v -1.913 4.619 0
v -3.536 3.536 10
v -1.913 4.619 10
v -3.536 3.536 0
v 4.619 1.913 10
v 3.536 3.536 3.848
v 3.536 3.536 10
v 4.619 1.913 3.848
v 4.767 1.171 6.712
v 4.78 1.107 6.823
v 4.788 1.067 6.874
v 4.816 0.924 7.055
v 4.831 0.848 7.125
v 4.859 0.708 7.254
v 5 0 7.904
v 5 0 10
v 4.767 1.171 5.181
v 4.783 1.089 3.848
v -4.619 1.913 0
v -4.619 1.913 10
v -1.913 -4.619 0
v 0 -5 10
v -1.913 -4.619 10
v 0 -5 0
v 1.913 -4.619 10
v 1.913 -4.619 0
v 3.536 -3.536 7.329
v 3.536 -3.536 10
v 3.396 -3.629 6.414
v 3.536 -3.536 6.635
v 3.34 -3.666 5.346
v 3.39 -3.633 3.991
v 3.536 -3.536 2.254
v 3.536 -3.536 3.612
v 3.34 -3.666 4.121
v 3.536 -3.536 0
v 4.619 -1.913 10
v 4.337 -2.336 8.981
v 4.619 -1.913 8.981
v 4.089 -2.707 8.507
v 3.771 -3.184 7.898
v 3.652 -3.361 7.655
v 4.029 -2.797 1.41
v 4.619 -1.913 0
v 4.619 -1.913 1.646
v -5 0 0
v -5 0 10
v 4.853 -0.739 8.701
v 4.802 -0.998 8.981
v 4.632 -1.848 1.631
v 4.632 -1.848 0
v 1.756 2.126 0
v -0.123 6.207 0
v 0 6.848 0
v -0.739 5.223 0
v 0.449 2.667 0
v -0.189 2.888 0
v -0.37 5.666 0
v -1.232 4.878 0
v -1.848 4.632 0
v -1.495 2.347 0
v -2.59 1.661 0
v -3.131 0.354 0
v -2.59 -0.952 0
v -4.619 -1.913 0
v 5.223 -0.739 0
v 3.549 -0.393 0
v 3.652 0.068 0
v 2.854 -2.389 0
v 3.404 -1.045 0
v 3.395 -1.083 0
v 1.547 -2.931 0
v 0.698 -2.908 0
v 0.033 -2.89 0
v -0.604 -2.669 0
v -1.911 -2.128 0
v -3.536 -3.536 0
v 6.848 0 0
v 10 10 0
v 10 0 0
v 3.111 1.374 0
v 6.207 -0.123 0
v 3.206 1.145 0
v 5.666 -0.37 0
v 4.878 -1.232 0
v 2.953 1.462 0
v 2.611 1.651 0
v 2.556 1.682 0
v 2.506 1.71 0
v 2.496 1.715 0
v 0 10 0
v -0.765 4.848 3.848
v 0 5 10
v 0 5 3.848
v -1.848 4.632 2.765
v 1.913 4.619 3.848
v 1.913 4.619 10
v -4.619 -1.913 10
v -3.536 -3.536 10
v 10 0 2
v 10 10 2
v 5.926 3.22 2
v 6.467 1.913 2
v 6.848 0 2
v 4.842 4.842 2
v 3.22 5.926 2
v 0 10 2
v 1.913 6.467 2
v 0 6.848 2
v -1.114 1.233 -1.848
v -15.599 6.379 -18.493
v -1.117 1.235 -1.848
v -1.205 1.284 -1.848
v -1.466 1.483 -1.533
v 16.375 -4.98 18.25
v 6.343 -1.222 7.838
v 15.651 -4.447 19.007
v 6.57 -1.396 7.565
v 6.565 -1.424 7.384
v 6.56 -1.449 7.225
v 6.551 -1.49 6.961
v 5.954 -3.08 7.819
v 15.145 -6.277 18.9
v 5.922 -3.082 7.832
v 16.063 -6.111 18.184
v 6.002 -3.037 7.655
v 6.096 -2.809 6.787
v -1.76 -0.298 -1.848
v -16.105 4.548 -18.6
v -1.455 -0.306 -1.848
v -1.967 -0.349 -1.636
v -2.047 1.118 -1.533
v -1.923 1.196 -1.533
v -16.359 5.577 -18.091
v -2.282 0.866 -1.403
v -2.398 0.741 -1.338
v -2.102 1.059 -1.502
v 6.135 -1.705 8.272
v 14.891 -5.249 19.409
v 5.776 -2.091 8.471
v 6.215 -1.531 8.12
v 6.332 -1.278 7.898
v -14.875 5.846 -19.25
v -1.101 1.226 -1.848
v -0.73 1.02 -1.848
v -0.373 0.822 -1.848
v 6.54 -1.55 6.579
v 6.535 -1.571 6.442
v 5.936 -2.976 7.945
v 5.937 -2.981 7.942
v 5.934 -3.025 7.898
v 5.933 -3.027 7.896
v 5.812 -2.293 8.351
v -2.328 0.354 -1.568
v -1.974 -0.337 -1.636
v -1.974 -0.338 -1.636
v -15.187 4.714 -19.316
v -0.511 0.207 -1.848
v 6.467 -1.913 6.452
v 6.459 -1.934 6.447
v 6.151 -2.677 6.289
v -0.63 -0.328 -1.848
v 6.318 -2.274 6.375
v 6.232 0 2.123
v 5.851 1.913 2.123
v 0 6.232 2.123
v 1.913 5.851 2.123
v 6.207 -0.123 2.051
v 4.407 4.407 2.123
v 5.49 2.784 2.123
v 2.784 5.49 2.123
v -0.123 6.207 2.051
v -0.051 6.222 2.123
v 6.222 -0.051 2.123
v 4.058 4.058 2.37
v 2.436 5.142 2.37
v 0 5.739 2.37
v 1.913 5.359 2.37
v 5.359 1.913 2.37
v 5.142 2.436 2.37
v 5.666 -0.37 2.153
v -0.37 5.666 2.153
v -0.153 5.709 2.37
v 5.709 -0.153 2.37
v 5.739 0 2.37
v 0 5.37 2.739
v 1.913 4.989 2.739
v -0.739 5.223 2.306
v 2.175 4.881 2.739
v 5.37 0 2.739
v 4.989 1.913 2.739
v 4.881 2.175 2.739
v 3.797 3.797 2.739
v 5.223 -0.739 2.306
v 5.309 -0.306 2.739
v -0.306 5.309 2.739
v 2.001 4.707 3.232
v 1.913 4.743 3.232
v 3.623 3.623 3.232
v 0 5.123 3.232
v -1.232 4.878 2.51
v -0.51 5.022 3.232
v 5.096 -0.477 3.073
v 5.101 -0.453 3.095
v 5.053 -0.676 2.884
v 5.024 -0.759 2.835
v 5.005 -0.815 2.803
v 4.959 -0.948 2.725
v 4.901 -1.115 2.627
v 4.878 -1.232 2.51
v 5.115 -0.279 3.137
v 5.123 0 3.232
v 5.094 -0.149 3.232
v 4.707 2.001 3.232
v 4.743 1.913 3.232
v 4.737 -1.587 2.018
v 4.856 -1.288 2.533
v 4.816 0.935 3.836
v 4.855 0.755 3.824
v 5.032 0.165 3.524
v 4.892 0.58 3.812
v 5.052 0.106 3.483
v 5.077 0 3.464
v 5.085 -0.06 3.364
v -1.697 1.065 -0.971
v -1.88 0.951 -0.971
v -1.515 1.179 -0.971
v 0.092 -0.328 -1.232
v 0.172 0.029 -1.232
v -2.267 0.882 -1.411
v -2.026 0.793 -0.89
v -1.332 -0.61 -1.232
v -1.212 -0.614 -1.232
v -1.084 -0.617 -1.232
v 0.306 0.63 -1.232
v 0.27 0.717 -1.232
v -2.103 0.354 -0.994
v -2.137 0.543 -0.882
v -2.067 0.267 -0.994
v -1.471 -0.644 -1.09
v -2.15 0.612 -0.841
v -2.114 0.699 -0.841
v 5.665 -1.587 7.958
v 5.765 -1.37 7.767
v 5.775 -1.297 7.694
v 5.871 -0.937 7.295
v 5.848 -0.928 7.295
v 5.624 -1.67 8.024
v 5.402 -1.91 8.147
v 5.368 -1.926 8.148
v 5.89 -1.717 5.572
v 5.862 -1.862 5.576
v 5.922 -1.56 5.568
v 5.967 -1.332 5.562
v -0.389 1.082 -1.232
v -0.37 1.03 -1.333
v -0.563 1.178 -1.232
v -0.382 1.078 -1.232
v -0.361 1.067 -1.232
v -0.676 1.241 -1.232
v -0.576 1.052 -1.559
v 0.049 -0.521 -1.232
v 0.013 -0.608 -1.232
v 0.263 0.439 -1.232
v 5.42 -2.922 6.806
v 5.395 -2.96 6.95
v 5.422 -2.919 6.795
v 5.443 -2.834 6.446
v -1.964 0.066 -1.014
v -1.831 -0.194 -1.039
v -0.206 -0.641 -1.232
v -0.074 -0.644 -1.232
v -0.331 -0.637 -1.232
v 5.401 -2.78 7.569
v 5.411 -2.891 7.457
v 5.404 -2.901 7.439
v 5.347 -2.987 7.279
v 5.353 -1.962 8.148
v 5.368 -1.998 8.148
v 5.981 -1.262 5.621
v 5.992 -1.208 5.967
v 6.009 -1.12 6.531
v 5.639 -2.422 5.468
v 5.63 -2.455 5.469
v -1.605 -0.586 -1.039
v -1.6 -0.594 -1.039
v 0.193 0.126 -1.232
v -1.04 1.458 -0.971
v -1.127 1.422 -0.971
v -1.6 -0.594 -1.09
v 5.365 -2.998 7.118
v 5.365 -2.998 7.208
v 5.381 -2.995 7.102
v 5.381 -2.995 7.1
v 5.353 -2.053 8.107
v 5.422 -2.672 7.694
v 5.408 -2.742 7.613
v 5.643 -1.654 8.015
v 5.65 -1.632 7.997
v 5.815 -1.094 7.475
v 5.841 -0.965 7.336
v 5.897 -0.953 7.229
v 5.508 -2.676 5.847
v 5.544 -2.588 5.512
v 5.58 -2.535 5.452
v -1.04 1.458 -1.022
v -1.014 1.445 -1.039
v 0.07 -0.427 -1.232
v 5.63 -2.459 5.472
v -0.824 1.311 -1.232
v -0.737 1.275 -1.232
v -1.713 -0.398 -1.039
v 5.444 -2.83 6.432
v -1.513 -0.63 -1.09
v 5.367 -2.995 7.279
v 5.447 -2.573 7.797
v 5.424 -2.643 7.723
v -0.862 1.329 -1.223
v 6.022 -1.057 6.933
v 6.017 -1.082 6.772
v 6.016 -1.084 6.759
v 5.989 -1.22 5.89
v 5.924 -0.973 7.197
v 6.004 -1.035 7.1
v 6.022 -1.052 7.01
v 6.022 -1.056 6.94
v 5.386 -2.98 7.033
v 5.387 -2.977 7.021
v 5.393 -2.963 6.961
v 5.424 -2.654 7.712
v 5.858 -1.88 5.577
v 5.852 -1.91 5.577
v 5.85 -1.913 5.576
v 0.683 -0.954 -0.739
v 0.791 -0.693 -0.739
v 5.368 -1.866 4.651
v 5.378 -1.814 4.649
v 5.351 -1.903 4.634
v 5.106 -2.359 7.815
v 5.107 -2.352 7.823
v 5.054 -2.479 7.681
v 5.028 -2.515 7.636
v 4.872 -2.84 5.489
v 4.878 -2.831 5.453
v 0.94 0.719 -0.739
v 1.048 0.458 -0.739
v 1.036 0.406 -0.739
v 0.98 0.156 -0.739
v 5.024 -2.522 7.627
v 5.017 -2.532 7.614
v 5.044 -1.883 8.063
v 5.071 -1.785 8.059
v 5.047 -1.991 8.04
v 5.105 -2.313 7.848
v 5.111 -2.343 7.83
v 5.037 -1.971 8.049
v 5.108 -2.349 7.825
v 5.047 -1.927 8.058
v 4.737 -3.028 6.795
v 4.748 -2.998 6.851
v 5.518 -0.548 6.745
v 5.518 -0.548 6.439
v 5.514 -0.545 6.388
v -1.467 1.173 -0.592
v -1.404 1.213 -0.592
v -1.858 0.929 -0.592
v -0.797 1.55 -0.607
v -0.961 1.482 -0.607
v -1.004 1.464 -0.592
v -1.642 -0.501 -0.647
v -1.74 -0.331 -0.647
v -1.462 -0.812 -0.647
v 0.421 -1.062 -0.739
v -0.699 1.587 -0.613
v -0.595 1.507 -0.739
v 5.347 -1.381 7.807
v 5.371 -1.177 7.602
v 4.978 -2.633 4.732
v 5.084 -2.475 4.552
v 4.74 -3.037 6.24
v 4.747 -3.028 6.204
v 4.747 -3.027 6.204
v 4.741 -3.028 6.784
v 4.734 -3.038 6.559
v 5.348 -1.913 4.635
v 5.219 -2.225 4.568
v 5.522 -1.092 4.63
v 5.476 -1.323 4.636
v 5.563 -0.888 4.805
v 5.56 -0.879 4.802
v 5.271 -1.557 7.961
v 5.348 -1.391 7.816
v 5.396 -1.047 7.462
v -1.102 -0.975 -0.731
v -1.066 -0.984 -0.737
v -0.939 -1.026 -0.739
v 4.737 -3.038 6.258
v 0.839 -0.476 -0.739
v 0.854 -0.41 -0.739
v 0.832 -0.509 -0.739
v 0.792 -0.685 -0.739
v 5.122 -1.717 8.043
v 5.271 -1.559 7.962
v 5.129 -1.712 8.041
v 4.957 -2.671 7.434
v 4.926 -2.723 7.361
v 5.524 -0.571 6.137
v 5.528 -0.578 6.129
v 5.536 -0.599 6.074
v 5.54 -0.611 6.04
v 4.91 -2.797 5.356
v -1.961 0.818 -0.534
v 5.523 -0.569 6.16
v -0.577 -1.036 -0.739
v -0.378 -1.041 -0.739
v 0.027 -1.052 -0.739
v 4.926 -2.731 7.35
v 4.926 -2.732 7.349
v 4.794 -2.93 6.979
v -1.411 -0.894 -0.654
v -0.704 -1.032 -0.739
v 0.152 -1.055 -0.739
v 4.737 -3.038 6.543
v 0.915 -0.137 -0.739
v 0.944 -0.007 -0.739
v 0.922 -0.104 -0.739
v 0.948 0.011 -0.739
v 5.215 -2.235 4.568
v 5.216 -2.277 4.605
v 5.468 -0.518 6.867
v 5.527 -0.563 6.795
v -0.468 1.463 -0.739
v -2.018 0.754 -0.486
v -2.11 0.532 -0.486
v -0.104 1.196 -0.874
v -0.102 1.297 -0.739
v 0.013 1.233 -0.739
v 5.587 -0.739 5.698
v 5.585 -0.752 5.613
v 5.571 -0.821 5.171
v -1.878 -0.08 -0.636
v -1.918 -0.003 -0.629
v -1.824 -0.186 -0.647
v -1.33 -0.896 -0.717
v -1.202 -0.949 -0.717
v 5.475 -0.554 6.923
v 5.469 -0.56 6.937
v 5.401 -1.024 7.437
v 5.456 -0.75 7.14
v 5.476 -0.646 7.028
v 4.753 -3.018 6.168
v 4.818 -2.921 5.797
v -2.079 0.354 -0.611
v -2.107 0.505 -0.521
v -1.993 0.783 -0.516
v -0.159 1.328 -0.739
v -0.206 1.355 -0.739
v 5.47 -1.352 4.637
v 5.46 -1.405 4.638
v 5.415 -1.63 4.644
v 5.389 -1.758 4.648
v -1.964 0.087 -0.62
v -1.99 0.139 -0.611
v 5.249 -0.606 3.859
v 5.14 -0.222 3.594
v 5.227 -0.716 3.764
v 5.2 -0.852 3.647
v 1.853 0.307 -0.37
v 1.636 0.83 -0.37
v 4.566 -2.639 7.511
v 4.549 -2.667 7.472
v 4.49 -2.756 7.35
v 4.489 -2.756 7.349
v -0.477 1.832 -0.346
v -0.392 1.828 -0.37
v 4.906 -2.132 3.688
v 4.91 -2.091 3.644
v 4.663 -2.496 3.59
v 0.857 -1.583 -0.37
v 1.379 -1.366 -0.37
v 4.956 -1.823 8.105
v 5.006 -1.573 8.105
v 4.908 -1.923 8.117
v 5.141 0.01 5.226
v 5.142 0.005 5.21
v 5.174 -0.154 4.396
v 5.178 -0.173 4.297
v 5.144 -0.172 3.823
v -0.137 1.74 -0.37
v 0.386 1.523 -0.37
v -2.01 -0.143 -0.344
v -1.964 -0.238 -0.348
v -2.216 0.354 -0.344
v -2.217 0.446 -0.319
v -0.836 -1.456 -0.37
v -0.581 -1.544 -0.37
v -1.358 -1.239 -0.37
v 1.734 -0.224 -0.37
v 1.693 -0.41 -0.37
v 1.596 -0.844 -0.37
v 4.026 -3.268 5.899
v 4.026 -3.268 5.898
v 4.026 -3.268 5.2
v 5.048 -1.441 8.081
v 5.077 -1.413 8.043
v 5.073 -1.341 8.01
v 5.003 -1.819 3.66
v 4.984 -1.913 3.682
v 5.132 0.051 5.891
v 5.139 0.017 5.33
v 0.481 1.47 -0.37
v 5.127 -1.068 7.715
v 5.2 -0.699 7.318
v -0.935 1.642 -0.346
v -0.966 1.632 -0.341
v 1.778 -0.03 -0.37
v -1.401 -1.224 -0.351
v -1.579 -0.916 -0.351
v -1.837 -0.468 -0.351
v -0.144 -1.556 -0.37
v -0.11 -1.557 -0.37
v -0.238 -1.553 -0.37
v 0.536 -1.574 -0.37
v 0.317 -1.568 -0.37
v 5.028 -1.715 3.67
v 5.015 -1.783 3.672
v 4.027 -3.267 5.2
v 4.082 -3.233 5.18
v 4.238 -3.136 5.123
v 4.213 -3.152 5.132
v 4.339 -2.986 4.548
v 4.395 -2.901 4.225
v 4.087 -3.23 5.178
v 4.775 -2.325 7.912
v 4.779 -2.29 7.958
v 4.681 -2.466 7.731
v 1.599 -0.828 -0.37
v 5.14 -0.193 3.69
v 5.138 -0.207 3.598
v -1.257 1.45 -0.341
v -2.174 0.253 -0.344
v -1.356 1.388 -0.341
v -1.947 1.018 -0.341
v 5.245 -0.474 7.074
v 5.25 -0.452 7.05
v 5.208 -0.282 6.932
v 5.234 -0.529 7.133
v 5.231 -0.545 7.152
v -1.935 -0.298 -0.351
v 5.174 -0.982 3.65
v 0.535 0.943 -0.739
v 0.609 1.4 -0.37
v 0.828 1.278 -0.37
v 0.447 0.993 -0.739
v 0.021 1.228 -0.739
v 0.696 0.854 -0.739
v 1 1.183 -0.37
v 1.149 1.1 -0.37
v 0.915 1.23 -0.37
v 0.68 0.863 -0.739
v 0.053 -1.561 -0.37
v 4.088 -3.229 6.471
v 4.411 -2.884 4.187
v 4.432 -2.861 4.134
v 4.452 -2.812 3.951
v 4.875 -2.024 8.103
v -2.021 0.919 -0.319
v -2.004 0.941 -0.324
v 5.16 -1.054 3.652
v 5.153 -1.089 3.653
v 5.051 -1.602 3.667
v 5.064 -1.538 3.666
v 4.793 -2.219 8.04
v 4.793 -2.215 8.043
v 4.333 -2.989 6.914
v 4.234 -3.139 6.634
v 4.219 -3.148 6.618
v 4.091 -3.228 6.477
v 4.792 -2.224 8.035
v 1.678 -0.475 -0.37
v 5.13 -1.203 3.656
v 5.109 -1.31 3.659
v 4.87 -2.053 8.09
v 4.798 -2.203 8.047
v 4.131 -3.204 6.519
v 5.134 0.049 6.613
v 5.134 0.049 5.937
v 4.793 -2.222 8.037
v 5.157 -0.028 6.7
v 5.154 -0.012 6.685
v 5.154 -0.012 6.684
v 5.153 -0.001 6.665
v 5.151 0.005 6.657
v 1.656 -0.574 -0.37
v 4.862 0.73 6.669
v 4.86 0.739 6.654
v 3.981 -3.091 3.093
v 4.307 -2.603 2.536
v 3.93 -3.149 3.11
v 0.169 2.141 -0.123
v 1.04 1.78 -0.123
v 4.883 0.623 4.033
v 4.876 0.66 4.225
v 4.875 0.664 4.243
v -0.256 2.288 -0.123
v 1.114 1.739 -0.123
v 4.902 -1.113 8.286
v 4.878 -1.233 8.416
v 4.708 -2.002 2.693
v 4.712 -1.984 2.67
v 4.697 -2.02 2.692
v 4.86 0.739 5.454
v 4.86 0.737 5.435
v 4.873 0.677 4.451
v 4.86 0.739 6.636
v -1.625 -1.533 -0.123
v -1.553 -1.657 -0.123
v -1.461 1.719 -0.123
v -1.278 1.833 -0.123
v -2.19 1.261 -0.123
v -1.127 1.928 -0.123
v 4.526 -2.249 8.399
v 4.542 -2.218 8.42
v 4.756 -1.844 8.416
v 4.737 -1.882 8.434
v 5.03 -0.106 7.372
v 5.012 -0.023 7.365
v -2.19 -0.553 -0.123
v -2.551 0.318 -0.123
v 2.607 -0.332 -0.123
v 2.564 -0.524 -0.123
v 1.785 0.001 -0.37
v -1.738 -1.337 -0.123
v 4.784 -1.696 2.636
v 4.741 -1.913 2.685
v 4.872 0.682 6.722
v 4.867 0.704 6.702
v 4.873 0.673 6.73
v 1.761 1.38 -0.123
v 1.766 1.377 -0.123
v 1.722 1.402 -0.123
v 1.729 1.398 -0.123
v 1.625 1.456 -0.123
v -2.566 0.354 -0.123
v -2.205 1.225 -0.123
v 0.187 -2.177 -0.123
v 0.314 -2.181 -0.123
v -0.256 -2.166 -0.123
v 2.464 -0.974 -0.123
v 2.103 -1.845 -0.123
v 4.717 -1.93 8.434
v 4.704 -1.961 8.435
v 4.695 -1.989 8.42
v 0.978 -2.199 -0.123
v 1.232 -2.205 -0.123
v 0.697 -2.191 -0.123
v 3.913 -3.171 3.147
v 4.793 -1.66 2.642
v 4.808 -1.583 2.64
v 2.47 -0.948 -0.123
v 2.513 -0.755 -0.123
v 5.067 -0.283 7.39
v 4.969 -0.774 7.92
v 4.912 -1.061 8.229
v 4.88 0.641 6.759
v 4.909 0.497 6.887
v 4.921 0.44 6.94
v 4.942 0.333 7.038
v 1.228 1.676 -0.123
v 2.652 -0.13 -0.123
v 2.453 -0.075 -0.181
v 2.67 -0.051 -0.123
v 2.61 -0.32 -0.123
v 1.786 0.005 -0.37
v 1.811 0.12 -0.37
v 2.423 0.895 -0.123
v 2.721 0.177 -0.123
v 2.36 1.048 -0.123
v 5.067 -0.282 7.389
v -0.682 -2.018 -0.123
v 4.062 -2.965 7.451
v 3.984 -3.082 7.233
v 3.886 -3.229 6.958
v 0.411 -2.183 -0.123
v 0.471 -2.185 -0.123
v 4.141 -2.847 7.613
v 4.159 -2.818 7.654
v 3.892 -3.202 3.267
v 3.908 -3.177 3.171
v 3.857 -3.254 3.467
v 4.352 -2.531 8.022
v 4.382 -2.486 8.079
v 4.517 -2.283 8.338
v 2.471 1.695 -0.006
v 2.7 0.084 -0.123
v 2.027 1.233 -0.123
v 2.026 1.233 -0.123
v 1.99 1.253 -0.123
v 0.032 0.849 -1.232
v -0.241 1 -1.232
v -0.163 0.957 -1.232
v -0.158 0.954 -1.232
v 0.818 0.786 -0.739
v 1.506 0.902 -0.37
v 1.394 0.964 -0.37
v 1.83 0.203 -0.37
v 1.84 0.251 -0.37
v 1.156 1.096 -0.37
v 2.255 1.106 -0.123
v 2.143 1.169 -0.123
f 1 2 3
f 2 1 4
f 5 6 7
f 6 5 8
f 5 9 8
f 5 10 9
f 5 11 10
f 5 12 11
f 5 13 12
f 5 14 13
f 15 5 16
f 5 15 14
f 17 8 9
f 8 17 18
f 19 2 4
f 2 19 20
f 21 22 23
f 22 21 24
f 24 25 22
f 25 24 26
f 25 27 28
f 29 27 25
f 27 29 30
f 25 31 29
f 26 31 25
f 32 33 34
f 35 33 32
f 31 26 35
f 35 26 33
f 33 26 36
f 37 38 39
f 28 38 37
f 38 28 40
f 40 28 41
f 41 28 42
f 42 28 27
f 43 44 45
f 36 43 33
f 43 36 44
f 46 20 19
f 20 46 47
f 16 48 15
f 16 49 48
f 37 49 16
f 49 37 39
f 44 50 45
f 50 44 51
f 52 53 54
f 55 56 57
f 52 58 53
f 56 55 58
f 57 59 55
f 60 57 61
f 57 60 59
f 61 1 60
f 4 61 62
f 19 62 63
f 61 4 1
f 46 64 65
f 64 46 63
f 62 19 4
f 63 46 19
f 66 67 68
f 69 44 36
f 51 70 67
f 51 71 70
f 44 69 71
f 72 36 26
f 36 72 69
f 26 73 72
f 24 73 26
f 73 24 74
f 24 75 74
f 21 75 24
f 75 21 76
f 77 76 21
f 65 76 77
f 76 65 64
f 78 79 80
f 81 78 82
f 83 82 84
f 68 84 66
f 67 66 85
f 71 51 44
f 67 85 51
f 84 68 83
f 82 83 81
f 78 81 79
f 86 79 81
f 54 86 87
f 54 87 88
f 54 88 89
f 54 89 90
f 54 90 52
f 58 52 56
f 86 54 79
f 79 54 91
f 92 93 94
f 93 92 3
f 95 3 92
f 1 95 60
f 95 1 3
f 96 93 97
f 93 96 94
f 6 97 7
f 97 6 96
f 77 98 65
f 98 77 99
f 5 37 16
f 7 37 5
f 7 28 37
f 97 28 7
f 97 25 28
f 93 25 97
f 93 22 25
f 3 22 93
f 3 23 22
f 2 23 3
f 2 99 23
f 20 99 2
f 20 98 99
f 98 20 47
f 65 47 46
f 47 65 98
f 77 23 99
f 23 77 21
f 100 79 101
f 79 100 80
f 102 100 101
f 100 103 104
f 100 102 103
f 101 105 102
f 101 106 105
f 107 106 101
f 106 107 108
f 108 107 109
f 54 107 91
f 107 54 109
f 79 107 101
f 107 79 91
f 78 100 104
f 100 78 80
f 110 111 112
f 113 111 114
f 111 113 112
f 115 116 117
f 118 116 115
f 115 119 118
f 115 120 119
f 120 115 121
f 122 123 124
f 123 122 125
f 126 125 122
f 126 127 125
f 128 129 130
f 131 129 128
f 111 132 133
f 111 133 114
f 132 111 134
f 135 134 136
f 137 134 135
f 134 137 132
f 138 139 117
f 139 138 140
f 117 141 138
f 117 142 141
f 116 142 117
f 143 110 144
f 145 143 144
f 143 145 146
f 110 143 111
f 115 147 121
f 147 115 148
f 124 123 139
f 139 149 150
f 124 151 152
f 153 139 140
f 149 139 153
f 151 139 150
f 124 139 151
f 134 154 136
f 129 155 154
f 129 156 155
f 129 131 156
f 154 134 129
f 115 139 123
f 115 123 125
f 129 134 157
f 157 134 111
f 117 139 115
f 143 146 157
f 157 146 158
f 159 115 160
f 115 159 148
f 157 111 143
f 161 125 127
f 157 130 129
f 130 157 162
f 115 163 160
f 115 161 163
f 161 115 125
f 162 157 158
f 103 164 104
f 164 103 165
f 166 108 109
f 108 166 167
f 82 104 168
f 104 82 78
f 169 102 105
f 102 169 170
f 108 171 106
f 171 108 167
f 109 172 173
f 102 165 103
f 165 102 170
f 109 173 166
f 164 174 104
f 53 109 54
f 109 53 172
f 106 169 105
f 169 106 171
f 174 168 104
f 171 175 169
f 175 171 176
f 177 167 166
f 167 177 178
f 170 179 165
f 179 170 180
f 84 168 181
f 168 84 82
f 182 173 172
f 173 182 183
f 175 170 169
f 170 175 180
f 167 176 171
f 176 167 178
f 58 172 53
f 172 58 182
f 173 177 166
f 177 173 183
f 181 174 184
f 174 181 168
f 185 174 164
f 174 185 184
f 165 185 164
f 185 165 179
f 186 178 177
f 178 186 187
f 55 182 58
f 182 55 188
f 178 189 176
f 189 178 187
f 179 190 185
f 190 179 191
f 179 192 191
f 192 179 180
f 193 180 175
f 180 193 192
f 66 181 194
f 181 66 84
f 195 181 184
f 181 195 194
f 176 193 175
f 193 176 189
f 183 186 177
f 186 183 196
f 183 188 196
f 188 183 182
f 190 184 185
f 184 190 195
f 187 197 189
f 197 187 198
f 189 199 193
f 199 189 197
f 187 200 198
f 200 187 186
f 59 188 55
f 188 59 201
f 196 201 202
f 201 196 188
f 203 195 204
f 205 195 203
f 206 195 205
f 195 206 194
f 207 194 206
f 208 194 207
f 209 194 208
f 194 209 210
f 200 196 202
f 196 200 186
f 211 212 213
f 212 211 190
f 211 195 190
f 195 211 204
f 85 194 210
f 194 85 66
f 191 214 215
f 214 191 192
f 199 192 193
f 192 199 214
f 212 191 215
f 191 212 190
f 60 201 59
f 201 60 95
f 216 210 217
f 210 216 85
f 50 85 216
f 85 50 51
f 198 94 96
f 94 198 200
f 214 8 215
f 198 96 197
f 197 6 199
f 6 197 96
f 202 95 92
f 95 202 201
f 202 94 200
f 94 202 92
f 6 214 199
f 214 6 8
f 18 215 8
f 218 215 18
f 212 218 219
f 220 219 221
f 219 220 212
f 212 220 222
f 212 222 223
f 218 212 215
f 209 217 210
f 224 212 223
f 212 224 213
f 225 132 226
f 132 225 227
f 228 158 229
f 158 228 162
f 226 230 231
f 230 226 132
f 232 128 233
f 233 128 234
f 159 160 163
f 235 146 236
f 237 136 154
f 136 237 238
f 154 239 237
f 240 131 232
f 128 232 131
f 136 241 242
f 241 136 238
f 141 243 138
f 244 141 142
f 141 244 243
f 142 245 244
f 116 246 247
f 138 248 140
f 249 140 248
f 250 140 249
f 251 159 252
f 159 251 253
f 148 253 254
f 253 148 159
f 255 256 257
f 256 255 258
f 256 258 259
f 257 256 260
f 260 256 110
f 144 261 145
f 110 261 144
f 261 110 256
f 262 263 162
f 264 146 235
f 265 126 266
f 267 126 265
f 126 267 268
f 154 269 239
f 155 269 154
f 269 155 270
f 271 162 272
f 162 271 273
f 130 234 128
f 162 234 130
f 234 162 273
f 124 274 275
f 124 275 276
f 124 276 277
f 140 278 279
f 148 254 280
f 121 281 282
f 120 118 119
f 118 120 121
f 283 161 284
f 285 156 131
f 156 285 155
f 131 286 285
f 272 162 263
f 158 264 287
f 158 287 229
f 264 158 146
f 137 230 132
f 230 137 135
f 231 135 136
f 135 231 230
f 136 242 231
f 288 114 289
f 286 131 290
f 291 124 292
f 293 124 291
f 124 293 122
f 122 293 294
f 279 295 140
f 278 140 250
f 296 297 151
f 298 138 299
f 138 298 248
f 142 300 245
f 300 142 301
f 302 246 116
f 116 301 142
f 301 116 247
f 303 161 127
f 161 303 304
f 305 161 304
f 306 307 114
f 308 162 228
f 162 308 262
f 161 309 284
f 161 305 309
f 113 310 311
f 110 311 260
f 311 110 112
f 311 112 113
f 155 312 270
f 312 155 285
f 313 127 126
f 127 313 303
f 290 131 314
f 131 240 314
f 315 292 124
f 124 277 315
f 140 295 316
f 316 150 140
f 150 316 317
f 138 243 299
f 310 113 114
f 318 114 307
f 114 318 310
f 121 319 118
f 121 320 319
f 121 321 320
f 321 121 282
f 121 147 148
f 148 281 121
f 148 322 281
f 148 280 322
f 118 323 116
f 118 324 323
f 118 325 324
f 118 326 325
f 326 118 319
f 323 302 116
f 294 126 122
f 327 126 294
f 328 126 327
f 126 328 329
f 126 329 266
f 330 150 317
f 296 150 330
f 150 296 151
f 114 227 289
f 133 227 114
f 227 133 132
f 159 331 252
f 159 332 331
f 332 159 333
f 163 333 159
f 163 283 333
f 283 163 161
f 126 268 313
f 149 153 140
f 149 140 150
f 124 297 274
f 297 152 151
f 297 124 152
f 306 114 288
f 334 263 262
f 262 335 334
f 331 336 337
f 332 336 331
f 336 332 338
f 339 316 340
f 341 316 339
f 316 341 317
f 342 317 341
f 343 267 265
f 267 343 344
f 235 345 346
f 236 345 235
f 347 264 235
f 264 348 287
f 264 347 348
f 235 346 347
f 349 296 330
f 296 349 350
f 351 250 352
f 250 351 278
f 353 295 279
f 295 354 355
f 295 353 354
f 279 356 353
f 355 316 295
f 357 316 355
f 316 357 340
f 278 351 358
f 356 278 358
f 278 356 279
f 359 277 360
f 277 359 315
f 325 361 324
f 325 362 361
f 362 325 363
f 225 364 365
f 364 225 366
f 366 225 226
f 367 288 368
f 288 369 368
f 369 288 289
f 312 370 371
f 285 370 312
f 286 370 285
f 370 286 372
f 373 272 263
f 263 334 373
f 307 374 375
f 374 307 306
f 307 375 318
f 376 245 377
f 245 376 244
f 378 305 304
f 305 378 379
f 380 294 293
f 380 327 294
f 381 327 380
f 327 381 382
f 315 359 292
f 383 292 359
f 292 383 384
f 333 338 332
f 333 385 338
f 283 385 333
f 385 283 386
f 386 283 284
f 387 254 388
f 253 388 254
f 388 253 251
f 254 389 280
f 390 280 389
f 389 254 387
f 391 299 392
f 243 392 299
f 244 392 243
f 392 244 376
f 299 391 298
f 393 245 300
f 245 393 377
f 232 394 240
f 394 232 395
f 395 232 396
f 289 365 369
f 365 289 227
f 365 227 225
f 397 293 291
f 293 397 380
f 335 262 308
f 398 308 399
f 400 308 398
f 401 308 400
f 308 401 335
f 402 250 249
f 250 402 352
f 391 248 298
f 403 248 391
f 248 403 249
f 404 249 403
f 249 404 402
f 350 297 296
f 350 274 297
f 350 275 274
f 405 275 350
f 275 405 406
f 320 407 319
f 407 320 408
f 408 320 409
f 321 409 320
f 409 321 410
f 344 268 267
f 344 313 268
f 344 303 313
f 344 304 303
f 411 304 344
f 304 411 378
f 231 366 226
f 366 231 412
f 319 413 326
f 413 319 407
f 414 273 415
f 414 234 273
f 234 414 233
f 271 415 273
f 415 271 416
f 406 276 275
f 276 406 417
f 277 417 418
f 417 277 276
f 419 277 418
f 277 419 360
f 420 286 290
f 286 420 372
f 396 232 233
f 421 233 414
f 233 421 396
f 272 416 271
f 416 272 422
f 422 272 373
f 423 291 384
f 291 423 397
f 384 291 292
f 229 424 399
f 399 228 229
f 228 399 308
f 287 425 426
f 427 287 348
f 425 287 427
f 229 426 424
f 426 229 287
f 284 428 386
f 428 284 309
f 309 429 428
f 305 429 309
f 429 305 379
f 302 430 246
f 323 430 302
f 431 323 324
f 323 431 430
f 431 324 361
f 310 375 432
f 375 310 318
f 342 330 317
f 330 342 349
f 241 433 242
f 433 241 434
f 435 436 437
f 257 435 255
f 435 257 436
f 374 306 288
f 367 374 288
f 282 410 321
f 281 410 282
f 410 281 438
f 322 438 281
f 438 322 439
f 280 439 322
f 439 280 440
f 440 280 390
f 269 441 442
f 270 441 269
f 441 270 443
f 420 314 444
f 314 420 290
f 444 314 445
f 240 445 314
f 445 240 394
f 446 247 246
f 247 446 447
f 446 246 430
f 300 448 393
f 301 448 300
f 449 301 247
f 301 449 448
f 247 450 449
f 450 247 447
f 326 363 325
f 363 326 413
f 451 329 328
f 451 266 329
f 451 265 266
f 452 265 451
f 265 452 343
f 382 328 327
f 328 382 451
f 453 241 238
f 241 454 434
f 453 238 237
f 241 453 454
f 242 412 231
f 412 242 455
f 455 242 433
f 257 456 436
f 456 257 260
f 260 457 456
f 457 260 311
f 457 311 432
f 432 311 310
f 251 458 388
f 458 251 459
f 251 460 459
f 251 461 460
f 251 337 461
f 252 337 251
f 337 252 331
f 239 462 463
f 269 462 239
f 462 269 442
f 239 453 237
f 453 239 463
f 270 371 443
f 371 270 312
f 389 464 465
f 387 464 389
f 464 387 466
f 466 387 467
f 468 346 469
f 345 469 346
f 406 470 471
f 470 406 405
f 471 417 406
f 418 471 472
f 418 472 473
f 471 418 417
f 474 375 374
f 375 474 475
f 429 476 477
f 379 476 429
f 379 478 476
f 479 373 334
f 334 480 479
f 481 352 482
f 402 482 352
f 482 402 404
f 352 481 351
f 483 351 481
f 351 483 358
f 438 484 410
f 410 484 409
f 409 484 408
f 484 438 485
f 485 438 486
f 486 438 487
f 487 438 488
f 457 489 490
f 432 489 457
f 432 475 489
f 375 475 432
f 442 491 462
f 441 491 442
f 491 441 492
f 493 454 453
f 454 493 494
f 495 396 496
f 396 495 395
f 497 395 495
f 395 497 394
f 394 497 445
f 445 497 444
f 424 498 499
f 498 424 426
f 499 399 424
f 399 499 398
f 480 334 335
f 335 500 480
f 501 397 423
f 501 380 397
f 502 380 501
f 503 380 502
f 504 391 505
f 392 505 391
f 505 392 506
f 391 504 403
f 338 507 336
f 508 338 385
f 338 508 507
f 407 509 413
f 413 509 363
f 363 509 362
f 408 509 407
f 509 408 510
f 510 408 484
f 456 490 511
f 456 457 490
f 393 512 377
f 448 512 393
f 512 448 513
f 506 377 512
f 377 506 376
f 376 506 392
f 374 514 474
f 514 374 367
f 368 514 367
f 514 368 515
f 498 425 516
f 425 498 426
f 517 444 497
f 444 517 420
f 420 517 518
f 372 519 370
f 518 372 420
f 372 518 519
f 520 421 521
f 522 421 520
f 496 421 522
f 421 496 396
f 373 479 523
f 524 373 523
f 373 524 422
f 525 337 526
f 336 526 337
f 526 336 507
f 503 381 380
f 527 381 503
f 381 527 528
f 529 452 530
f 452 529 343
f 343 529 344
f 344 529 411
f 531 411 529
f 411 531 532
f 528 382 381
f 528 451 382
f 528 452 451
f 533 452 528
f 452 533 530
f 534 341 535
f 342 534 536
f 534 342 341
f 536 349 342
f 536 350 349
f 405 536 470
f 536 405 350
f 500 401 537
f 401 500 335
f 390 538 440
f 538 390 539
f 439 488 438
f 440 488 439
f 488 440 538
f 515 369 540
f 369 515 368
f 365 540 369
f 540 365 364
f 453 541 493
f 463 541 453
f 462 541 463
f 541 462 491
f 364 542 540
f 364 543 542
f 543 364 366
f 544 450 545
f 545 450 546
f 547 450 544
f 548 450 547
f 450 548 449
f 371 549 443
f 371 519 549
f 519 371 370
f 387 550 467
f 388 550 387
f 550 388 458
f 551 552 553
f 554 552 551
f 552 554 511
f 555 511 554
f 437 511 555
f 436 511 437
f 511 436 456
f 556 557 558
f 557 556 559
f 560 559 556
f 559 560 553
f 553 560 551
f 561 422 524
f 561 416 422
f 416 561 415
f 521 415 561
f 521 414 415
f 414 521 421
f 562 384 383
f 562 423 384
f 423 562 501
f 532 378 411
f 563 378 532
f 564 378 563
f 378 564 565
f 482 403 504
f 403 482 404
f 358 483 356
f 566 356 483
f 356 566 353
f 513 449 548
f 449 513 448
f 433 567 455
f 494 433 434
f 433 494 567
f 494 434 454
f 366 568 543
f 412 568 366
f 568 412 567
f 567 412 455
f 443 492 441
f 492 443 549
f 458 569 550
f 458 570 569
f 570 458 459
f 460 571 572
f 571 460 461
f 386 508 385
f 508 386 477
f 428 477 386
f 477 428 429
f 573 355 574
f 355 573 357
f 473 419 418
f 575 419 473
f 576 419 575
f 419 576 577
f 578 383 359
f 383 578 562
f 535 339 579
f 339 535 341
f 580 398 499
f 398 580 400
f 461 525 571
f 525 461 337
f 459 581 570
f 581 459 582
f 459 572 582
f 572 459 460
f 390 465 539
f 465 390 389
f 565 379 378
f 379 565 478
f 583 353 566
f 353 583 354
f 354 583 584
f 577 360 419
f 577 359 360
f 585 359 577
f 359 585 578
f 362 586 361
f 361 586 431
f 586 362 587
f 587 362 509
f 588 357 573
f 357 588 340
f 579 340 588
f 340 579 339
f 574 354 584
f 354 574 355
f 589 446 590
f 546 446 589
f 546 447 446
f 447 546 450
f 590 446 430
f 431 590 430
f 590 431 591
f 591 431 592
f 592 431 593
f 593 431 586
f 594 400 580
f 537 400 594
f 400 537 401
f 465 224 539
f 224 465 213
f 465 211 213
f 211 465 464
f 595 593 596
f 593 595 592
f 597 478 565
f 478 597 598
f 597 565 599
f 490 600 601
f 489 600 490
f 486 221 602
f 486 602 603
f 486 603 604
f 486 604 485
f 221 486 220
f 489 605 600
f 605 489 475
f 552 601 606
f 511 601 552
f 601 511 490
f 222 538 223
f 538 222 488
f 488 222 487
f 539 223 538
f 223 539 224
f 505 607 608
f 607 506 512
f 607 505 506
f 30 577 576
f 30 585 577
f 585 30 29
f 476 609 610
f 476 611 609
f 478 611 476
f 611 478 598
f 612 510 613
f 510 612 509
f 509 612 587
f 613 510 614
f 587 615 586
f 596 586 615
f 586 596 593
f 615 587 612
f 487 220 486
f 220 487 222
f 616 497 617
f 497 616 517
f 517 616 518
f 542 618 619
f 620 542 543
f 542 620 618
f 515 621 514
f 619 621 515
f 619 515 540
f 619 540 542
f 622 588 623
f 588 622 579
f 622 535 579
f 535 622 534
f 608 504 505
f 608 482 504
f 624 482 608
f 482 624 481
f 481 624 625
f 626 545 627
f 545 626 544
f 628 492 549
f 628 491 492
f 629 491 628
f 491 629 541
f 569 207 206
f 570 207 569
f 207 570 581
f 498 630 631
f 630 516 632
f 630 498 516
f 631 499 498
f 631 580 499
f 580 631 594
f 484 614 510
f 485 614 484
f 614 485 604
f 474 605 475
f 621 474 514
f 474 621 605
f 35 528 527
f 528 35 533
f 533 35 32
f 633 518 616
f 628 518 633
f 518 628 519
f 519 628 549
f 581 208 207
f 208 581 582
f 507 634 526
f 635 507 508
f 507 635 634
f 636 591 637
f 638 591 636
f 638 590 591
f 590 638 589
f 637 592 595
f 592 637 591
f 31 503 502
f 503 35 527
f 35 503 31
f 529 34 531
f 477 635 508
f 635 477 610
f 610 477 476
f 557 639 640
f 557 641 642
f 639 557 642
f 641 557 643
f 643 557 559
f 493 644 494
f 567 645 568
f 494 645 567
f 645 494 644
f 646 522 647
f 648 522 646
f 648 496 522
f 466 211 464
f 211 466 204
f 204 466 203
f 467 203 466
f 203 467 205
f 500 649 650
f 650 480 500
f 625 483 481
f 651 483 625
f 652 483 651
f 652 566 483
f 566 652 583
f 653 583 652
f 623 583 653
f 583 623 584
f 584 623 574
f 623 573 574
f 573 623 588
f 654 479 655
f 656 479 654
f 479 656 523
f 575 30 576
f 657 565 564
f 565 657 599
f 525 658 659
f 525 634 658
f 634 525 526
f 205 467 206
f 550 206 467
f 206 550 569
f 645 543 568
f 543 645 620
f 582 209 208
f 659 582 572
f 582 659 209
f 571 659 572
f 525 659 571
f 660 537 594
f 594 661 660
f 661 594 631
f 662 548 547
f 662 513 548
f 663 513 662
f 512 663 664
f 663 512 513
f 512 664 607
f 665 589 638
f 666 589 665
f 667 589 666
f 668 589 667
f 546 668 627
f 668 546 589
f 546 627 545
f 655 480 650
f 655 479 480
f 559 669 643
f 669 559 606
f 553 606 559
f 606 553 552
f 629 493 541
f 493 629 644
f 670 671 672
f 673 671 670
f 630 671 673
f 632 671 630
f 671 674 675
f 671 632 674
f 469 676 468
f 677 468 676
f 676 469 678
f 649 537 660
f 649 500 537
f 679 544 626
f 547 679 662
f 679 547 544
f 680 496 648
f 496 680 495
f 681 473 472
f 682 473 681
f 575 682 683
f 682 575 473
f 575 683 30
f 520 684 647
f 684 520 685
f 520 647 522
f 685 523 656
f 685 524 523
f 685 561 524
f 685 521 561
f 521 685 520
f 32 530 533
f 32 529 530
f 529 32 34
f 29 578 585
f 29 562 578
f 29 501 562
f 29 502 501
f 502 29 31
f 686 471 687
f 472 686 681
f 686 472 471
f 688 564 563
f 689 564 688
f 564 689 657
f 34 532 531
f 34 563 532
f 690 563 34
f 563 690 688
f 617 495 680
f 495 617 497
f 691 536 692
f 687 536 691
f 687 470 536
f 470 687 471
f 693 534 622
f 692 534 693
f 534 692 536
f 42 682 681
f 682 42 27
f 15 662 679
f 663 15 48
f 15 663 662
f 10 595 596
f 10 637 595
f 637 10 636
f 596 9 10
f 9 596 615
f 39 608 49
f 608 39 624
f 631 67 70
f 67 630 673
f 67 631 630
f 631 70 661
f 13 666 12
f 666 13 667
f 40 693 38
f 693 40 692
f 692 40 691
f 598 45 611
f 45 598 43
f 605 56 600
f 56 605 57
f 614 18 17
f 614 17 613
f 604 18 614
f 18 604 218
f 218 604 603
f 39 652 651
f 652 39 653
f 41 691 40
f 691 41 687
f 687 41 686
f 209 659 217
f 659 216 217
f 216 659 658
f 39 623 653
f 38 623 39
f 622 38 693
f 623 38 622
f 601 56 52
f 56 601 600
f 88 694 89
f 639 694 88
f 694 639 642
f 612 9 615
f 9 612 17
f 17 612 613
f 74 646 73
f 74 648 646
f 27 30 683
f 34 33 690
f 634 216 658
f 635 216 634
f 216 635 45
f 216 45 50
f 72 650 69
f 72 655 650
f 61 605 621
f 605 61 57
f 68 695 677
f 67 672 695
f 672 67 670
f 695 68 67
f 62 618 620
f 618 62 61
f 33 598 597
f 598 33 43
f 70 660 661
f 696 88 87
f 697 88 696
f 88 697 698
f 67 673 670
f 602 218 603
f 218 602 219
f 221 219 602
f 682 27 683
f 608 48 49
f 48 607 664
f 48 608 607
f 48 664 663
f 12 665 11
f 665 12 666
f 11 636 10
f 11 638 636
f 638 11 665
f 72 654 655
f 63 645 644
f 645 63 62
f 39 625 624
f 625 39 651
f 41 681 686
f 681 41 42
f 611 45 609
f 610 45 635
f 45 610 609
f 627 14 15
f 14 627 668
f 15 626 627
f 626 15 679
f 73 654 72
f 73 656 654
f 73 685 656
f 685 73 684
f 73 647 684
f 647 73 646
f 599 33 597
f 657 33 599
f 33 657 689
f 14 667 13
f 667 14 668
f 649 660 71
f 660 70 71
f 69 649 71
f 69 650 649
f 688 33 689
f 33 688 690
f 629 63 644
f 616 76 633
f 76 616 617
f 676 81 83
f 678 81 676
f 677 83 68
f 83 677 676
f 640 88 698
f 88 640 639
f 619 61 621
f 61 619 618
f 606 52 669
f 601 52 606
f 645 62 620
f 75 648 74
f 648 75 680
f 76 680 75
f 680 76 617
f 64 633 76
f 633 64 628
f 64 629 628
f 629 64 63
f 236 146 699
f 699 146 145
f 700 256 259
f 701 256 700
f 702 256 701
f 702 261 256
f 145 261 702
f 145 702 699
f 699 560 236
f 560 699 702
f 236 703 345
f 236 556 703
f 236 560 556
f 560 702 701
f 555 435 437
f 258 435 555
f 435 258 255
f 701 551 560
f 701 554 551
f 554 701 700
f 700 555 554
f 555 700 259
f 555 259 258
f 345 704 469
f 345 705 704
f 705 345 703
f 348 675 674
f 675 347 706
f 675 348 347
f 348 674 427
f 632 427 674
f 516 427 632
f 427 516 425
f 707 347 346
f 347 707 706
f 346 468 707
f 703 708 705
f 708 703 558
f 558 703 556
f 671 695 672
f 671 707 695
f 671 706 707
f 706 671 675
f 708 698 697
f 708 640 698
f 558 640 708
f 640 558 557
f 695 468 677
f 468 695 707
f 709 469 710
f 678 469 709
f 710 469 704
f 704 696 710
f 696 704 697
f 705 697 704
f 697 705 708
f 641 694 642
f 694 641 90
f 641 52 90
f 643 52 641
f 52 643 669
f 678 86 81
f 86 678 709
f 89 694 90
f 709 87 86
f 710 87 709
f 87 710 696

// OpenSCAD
// Fillet function

module fillet(r=1.0,steps=3,include=true) {
  if(include) for (k=[0:$children-1]) {
	children(k);
  }
  for (i=[0:$children-2] ) {
    for(j=[i+1:$children-1] ) {
	fillet_two(r=r,steps=steps) {
	  children(i);
	  children(j);
	  intersection() {
		children(i);
		children(j);
	  }
	}
    }
  }
}

module fillet_two(r=1.0,steps=3) {
  for(step=[1:steps]) {
	hull() {
	  render() intersection() {
		children(0);
		offset_3d(r=r*step/steps) children(2);
	  }
	  render() intersection() {
		children(1);
		offset_3d(r=r*(steps-step+1)/steps) children(2);
	  }
	}
  }
}

module offset_3d(r=1.0) {
  for(k=[0:$children-1]) minkowski() {
	children(k);
	sphere(r=r,$fn=8);
  }
}

fillet(r=2,steps=5) {
	cylinder(r=5,h=10);
	cube([10,10,2]);
	rotate([30,30,30]) cylinder(r=1.0,h=50,center=true);
}
